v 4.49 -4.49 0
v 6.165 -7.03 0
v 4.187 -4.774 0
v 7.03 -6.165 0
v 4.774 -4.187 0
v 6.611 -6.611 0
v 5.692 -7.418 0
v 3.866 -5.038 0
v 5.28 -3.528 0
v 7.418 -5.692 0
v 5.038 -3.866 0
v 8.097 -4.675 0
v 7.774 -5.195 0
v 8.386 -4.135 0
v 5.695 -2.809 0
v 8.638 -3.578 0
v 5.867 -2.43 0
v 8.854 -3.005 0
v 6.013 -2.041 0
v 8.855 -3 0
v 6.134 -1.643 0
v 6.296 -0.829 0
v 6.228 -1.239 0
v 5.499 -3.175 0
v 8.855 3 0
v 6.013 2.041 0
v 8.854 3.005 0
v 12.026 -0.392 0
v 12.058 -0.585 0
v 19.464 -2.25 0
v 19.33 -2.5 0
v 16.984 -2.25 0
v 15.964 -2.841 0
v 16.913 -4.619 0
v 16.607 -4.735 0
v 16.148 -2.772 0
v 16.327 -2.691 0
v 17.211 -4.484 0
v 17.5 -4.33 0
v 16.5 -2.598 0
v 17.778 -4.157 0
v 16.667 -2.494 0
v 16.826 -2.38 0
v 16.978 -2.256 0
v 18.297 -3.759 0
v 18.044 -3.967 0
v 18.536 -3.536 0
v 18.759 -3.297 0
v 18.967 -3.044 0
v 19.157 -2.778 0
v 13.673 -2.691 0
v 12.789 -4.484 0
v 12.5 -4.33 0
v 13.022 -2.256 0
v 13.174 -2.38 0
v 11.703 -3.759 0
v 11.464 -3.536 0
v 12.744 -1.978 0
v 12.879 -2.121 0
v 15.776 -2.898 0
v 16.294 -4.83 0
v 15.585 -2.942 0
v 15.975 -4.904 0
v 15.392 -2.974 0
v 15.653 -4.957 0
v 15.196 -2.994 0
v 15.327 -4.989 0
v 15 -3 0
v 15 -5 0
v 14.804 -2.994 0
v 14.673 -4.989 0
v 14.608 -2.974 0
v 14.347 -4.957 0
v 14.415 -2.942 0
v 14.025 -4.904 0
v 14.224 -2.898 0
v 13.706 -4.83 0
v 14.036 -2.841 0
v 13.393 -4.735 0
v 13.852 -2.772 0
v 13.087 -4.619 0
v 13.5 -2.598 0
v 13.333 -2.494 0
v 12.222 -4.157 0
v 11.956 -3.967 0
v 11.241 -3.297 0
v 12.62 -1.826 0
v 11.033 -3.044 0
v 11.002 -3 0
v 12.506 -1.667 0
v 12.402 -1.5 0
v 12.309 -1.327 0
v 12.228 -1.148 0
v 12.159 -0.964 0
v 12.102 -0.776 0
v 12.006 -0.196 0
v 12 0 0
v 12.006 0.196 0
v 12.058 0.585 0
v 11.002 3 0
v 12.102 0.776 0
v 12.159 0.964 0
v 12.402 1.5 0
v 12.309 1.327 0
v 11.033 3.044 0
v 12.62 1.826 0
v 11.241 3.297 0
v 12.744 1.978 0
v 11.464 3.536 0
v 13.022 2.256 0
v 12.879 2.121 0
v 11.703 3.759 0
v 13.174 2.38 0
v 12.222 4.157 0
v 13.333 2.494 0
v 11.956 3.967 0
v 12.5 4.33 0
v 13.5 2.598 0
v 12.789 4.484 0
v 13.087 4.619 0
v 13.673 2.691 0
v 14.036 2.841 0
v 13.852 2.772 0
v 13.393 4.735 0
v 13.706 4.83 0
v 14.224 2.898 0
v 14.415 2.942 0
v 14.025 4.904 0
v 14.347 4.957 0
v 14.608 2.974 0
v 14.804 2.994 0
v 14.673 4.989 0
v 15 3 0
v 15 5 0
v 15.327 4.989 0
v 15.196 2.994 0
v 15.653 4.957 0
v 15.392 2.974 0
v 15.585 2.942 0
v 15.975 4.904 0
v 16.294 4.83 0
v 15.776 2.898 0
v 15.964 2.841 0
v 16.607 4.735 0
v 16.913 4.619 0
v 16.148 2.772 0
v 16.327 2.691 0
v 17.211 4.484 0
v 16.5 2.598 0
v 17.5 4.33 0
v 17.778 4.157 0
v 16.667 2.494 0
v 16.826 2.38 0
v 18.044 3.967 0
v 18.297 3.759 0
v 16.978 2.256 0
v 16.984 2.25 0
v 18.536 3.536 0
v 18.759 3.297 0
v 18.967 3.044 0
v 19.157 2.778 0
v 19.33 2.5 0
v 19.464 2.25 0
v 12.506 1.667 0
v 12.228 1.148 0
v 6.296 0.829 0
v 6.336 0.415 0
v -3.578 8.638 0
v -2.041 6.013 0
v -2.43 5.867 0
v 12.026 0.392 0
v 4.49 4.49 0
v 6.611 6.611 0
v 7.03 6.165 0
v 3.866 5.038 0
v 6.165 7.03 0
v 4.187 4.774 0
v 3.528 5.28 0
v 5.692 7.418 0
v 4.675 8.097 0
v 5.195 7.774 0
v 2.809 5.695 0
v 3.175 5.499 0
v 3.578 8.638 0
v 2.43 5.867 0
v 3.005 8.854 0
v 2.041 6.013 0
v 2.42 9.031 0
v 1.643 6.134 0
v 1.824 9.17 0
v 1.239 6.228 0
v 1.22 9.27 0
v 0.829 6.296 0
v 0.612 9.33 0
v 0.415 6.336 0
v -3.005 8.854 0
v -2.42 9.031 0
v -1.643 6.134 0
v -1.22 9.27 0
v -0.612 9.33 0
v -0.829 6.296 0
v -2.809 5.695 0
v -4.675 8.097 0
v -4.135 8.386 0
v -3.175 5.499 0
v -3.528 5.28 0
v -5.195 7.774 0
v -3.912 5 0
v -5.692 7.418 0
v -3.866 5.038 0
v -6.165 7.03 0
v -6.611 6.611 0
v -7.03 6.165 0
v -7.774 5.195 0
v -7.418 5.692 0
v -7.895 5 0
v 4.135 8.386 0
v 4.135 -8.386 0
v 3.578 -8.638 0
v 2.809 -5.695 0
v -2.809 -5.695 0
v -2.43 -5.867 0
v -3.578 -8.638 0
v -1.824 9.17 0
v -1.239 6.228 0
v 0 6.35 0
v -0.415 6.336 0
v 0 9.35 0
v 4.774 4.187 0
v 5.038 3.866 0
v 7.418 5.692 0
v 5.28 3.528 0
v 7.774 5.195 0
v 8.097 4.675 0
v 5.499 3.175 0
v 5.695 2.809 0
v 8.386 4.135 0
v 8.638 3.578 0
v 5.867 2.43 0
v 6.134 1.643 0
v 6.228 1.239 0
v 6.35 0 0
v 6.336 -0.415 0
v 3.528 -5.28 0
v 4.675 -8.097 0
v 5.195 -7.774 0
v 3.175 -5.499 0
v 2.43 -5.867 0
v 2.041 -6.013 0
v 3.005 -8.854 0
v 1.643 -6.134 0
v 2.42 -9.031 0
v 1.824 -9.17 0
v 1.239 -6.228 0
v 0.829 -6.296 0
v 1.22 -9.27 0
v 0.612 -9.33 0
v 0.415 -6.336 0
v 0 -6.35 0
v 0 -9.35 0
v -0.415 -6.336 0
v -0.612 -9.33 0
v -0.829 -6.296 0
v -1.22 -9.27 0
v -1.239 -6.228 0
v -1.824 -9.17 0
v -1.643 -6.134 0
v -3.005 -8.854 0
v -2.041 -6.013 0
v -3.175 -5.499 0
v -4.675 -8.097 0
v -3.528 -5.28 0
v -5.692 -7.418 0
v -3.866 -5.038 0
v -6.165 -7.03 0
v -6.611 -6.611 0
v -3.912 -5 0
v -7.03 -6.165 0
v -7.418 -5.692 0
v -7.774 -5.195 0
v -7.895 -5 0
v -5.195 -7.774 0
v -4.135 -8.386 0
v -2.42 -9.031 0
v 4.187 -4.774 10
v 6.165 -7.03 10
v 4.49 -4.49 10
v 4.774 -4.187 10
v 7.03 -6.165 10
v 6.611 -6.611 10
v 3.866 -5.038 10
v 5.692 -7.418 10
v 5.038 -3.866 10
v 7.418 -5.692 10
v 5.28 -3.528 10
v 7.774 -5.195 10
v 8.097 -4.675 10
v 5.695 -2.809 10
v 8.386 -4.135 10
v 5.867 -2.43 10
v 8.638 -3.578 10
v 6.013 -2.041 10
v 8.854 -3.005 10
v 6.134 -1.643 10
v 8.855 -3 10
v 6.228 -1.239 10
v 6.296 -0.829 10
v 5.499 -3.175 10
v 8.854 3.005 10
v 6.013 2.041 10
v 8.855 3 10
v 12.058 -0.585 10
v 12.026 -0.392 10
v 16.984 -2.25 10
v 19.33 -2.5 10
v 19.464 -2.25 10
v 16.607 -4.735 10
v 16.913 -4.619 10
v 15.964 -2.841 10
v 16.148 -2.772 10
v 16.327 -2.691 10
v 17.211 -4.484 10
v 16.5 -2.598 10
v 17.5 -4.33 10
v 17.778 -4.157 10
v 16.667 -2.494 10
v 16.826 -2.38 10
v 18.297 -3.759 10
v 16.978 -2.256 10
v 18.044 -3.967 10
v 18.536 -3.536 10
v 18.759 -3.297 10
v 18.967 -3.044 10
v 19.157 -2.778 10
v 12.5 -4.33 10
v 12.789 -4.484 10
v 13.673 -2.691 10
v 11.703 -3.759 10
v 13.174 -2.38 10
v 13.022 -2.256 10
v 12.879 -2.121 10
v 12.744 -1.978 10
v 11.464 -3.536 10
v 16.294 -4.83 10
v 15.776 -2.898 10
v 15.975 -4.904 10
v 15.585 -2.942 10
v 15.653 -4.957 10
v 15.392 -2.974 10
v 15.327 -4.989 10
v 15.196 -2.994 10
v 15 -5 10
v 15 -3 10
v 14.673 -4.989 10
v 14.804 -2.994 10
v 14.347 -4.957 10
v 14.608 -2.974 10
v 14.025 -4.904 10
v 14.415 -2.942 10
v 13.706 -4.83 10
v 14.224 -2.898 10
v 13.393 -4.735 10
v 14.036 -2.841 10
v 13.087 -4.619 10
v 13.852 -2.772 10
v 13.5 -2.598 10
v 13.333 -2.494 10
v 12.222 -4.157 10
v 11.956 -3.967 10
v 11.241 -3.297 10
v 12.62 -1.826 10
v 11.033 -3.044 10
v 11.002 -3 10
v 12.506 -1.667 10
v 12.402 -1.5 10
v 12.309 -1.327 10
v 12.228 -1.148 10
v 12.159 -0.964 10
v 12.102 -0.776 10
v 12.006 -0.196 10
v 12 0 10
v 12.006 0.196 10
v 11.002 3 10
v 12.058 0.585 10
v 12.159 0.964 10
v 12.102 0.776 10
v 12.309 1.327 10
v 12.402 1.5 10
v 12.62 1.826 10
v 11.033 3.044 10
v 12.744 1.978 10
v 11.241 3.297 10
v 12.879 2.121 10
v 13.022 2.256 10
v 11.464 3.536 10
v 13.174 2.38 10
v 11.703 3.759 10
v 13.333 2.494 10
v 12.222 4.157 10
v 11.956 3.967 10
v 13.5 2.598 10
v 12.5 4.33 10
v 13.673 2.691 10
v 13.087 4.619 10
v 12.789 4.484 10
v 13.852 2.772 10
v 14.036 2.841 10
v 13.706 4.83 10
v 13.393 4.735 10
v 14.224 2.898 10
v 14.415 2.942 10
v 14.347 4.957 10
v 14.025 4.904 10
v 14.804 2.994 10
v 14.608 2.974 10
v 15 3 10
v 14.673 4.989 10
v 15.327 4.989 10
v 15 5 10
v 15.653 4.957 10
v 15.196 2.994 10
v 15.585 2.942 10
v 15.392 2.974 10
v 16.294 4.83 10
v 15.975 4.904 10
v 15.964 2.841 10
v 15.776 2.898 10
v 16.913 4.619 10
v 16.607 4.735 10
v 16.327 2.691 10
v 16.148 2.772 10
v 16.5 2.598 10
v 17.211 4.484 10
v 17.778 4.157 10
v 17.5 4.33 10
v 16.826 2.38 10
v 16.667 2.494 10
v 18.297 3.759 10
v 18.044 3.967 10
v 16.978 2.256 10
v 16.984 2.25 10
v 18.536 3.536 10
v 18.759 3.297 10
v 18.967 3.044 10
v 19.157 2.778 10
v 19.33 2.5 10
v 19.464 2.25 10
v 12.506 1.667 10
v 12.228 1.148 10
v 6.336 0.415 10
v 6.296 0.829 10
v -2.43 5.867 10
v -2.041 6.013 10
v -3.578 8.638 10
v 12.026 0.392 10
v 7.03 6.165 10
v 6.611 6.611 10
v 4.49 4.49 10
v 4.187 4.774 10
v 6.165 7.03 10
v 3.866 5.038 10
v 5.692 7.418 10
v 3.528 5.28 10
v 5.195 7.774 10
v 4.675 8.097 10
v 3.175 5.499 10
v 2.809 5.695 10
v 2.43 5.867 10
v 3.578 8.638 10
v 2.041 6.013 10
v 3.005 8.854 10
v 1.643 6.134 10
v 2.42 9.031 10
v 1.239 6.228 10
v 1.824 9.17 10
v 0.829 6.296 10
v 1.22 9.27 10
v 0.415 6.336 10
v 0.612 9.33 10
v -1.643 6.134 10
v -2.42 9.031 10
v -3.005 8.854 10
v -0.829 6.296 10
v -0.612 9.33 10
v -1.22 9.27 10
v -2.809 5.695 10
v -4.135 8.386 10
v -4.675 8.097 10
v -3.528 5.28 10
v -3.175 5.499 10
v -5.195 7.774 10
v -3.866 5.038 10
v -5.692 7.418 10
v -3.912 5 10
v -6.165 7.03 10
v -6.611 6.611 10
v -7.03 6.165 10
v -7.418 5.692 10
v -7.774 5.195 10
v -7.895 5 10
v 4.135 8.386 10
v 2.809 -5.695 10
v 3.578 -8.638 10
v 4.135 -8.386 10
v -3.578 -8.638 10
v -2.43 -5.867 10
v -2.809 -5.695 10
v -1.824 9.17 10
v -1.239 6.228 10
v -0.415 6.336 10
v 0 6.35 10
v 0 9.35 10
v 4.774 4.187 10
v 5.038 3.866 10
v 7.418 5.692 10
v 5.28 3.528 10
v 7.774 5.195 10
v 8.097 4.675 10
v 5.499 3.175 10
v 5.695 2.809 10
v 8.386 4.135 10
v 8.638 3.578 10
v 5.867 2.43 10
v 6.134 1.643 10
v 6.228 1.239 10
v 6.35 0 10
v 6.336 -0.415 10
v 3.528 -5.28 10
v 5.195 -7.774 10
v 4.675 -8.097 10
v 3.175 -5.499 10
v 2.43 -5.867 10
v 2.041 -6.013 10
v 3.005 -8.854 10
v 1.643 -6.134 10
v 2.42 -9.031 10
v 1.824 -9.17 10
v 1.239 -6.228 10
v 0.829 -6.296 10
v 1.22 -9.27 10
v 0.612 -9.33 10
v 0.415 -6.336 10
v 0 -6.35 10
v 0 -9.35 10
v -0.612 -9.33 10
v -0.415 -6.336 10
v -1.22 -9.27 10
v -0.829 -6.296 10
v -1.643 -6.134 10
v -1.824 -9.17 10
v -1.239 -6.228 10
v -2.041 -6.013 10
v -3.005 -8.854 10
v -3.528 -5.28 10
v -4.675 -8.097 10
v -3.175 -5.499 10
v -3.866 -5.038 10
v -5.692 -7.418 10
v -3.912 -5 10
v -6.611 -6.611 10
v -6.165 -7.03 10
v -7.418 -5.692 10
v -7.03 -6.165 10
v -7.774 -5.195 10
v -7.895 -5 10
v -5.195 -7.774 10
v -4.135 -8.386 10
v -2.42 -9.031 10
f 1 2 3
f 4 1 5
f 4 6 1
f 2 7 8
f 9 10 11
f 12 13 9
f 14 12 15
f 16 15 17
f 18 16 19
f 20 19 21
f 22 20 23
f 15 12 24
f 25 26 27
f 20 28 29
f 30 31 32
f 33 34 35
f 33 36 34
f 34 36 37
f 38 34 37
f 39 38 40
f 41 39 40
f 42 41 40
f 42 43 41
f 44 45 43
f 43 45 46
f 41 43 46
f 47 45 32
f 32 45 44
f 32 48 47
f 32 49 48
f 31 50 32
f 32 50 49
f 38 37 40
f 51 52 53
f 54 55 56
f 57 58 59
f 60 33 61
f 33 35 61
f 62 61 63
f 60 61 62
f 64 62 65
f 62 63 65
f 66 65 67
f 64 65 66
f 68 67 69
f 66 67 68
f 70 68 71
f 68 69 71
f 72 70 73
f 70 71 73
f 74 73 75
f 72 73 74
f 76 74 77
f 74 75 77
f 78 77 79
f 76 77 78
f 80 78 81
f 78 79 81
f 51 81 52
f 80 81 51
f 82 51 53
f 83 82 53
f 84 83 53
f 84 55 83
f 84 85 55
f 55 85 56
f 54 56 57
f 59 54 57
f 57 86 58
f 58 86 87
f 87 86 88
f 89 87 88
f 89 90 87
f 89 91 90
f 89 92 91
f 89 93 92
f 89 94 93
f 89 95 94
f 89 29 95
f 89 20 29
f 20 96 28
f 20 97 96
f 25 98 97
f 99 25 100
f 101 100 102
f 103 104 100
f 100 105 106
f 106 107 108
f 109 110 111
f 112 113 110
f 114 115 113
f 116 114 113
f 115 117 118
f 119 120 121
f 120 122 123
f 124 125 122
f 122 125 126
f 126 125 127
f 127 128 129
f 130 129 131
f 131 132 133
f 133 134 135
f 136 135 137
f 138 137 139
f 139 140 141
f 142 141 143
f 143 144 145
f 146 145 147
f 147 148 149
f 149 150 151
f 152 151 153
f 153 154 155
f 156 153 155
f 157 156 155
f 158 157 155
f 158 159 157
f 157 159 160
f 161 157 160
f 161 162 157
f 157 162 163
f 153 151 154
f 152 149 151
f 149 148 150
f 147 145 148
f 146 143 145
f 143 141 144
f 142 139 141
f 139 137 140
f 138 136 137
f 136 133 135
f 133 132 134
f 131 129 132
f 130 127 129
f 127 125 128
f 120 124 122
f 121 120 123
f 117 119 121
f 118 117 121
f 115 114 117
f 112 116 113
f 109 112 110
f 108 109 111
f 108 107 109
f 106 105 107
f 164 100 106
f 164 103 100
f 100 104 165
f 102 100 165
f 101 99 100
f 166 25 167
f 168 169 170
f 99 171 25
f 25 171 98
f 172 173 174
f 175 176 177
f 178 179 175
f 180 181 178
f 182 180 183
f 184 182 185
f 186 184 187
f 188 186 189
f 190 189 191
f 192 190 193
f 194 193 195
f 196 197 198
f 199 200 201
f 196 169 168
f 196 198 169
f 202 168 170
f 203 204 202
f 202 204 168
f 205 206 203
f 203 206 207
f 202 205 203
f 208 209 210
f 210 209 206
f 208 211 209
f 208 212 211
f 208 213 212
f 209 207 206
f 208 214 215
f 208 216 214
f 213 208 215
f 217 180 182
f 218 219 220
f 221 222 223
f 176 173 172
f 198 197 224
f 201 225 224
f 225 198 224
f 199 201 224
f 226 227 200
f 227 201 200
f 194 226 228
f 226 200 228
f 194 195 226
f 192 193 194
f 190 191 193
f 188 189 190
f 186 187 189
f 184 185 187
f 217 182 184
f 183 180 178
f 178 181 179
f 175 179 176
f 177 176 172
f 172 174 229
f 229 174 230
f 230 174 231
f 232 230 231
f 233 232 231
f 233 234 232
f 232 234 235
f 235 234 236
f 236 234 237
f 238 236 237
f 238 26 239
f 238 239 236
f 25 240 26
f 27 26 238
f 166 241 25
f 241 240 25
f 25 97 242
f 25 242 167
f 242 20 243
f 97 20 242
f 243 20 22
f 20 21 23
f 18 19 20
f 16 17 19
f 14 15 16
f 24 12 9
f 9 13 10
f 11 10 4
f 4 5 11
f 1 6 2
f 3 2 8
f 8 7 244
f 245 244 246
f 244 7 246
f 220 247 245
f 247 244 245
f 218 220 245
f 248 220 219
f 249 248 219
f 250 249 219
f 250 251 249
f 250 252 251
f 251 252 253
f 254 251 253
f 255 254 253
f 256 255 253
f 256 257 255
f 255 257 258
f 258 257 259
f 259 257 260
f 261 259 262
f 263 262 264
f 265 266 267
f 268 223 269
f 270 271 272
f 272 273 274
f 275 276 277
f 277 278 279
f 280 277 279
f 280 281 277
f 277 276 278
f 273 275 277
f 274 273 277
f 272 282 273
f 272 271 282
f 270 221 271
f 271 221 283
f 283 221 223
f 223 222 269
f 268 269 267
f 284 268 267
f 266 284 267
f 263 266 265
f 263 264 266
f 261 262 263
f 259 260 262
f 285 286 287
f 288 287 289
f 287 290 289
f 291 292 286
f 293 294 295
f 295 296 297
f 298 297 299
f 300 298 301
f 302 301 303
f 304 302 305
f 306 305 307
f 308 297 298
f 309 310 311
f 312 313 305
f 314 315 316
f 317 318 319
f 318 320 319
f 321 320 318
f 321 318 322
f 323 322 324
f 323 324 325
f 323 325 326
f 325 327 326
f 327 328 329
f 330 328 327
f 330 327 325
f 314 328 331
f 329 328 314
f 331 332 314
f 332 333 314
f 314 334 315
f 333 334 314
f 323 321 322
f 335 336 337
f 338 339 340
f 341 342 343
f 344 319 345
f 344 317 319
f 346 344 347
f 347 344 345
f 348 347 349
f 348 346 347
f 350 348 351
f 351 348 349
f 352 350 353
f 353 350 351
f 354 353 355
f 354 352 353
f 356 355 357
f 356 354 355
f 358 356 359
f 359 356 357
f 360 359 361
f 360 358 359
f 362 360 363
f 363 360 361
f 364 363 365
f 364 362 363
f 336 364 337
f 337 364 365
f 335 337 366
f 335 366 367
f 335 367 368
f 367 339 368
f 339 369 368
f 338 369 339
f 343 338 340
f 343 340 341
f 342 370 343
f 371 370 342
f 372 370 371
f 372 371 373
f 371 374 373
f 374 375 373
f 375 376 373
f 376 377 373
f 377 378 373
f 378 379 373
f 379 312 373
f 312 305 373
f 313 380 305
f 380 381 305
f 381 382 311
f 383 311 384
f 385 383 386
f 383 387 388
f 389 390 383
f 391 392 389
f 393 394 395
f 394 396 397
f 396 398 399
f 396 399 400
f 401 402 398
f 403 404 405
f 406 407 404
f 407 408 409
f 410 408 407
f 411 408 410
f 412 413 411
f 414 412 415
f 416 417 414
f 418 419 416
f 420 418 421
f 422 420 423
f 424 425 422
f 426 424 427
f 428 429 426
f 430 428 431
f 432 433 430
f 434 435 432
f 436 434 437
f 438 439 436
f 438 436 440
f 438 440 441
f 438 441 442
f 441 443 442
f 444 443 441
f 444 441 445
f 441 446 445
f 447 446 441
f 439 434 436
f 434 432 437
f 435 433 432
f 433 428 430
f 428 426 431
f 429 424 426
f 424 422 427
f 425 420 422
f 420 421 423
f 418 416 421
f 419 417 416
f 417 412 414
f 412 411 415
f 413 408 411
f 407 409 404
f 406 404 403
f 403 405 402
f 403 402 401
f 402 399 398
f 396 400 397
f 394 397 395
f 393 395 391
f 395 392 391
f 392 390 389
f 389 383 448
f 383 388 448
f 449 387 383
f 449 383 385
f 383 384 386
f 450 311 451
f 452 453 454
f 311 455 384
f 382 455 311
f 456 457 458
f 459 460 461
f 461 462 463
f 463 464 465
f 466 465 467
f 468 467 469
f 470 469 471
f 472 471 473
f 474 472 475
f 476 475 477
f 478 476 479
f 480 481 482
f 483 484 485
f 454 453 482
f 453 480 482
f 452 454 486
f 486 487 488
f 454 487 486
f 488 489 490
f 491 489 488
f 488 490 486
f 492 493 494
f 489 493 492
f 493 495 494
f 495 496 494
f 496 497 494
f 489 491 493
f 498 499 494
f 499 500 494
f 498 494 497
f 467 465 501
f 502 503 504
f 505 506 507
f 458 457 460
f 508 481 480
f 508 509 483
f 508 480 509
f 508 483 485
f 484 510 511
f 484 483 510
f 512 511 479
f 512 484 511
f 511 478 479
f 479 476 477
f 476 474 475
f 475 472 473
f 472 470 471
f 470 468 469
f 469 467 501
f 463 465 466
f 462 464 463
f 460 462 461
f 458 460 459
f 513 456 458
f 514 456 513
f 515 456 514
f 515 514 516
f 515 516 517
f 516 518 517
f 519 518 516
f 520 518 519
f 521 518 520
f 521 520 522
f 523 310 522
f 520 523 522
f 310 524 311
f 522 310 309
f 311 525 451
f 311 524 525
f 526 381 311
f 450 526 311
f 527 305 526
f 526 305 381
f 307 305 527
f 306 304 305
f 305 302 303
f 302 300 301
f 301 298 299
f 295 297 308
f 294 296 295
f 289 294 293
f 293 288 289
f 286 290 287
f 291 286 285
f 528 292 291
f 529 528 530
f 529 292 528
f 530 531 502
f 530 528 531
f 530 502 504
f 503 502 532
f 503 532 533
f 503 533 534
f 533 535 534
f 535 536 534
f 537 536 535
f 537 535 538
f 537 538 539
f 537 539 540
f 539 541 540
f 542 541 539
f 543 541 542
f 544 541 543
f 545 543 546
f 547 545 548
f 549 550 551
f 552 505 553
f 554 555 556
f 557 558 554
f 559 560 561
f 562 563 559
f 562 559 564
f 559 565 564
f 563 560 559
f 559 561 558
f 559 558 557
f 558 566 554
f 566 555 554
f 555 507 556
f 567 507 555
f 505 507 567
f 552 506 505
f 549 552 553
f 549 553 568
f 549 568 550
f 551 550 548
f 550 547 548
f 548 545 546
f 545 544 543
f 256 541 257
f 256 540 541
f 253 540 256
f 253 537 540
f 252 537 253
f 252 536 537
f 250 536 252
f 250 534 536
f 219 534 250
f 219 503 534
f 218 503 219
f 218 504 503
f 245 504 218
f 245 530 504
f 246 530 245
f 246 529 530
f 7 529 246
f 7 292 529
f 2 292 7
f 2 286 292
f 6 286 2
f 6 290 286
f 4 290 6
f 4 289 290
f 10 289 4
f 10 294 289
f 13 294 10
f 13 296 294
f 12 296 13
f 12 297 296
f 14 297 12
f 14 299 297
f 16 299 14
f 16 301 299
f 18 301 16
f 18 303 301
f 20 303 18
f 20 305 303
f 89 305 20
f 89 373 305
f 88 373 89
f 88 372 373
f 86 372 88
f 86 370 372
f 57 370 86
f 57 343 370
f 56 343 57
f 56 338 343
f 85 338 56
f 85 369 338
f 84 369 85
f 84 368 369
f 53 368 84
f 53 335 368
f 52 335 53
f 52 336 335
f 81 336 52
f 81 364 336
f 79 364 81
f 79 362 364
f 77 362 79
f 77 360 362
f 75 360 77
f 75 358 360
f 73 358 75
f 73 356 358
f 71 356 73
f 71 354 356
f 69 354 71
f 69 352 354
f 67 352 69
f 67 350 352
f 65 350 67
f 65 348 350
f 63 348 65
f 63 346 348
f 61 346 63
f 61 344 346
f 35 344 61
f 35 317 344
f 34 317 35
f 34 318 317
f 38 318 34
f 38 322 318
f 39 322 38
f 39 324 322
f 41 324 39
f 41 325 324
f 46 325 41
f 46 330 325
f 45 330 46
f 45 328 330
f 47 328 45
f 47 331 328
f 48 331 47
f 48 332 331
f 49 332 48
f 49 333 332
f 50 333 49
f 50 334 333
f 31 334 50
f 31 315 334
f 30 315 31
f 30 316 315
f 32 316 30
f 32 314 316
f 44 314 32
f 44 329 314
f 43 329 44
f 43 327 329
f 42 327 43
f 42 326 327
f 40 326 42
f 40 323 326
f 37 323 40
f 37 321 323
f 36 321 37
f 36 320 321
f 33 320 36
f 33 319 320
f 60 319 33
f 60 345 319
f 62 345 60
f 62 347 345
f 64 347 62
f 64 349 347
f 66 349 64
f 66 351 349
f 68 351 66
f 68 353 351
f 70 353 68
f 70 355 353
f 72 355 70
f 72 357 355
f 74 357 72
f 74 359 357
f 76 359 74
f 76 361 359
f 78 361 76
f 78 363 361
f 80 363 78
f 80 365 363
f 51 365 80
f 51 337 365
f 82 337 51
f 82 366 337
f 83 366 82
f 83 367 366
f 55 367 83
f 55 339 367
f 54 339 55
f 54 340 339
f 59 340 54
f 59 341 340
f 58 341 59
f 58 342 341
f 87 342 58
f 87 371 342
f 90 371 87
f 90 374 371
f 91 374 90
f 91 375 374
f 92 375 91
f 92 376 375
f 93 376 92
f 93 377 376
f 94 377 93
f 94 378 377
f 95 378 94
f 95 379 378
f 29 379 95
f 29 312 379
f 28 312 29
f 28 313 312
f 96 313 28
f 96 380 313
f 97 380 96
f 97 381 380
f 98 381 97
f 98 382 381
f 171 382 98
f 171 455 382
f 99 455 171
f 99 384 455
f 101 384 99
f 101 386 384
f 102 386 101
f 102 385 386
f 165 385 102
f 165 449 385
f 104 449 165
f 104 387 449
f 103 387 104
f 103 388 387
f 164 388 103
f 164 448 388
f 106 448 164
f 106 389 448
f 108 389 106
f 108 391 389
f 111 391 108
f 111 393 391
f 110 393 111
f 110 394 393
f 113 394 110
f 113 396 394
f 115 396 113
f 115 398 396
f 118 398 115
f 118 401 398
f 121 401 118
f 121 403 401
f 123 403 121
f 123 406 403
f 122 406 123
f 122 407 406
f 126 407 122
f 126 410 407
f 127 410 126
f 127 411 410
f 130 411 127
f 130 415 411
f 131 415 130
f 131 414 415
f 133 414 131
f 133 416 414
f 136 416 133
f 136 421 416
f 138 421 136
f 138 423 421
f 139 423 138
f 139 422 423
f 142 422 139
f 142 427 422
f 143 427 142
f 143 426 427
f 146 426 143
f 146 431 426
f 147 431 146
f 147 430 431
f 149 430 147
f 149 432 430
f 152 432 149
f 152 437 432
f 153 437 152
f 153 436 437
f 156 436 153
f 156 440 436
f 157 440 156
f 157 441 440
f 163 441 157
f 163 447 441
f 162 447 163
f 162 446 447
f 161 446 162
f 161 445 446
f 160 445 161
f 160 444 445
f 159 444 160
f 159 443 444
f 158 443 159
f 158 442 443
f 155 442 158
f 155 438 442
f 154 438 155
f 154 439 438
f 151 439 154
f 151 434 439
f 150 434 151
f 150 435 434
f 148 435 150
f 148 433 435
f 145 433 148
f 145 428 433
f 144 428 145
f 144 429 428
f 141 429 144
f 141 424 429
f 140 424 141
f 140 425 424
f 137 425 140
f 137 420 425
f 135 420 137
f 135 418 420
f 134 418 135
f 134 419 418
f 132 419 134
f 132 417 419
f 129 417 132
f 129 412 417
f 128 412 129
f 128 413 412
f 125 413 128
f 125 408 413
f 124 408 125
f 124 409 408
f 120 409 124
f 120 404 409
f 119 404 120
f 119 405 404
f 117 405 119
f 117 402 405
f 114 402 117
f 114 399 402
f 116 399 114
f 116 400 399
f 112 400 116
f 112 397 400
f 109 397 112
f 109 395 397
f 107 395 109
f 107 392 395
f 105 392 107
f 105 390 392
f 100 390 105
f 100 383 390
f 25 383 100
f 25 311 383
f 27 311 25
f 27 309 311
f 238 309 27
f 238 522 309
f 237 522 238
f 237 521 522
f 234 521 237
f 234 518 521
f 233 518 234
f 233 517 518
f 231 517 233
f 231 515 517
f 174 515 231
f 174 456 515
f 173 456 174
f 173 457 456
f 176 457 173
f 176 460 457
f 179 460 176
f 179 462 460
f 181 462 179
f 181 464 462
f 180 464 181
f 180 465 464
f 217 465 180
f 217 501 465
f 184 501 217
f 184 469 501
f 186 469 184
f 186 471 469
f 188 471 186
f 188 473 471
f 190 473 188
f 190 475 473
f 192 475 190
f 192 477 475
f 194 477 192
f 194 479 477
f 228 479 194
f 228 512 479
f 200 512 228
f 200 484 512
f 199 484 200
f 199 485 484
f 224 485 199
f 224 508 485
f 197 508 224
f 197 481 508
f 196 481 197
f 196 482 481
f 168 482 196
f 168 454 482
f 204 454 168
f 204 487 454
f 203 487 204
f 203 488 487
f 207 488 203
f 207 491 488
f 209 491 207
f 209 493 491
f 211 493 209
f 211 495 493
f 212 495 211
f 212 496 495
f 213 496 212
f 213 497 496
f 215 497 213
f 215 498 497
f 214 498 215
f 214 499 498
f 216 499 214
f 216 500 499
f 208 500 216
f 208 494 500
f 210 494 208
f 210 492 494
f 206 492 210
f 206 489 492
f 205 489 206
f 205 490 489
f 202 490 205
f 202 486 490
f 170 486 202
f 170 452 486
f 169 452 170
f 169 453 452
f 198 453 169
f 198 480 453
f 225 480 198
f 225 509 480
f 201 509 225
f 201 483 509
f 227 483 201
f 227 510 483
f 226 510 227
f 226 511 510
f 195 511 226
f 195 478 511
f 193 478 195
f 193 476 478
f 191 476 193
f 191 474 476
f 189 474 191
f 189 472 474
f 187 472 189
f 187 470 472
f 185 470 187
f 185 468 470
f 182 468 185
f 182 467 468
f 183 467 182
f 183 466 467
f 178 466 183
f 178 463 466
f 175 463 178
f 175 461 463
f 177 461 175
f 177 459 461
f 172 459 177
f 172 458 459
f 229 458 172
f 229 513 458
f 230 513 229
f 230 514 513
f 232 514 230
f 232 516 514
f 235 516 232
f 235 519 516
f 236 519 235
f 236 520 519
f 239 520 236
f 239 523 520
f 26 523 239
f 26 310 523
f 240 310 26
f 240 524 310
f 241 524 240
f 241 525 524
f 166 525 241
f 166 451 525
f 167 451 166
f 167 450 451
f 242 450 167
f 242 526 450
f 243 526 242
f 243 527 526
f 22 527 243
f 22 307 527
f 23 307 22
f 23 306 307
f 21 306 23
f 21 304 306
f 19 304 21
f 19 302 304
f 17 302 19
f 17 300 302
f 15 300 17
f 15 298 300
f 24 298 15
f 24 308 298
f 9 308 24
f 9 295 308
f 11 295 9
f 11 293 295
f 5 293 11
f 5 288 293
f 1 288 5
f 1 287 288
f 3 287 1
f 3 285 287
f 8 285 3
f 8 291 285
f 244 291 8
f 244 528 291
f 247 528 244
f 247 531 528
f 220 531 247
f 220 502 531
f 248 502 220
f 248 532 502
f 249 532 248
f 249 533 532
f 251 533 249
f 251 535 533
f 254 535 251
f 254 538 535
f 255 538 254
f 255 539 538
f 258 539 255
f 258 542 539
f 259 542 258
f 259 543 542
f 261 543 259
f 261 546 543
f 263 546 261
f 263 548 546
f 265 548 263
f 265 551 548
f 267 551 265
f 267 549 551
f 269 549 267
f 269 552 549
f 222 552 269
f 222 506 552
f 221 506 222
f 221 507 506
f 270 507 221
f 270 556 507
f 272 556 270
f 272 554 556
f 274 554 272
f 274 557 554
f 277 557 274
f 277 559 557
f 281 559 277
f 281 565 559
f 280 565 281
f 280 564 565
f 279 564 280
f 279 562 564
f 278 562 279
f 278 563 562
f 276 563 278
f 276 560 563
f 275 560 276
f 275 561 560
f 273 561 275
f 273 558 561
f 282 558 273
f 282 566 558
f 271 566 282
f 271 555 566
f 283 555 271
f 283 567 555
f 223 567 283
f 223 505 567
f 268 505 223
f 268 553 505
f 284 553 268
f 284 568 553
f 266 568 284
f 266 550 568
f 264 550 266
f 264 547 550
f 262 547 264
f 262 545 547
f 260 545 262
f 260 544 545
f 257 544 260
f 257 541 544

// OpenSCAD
// Snap-on tubing clip for 12.7 mm (1/2") lab stand rod
// Printed flat: 2-D profile extruded along Z

$fn = 96;

// ---------- Parameters ----------
clip_h        = 10;     // extrusion height (Z)

// Rod ring
rod_id        = 12.7;   // rod ring inner diameter
rod_wall      = 3;      // rod ring wall thickness
rod_od        = rod_id + 2*rod_wall; // 18.7 outer diameter
rod_open_w    = 10;     // opening width on -X side (Y extent)

// Tubing ring
tube_x        = 15;     // tubing ring centre X
tube_id       = 6;      // tubing ring inner diameter
tube_wall     = 2;      // tubing ring wall thickness
tube_od       = tube_id + 2*tube_wall; // 10 outer diameter
tube_open_w   = 4.5;    // opening width on +X side (Y extent)

// Bridge
bridge_x0     = 8;      // bridge start X
bridge_x1     = 12;     // bridge end X
bridge_w      = 6;      // bridge width (Y)

eps           = 0.5;    // overshoot for cutting shapes

// ---------- 2-D profile ----------
module profile() {
    difference() {
        // Solid material
        union() {
            circle(d = rod_od);
            translate([tube_x, 0]) circle(d = tube_od);
            translate([bridge_x0, -bridge_w/2])
                square([bridge_x1 - bridge_x0, bridge_w]);
        }
        // Rod bore
        circle(d = rod_id);
        // Tubing bore
        translate([tube_x, 0]) circle(d = tube_id);
        // Rod opening: x < 0, -5 < y < 5
        translate([-rod_od/2 - eps, -rod_open_w/2])
            square([rod_od/2 + eps, rod_open_w]);
        // Tubing opening: x > 15, -2.25 < y < 2.25
        translate([tube_x, -tube_open_w/2])
            square([tube_od/2 + eps, tube_open_w]);
    }
}

// ---------- 3-D part ----------
linear_extrude(height = clip_h)
    profile();
